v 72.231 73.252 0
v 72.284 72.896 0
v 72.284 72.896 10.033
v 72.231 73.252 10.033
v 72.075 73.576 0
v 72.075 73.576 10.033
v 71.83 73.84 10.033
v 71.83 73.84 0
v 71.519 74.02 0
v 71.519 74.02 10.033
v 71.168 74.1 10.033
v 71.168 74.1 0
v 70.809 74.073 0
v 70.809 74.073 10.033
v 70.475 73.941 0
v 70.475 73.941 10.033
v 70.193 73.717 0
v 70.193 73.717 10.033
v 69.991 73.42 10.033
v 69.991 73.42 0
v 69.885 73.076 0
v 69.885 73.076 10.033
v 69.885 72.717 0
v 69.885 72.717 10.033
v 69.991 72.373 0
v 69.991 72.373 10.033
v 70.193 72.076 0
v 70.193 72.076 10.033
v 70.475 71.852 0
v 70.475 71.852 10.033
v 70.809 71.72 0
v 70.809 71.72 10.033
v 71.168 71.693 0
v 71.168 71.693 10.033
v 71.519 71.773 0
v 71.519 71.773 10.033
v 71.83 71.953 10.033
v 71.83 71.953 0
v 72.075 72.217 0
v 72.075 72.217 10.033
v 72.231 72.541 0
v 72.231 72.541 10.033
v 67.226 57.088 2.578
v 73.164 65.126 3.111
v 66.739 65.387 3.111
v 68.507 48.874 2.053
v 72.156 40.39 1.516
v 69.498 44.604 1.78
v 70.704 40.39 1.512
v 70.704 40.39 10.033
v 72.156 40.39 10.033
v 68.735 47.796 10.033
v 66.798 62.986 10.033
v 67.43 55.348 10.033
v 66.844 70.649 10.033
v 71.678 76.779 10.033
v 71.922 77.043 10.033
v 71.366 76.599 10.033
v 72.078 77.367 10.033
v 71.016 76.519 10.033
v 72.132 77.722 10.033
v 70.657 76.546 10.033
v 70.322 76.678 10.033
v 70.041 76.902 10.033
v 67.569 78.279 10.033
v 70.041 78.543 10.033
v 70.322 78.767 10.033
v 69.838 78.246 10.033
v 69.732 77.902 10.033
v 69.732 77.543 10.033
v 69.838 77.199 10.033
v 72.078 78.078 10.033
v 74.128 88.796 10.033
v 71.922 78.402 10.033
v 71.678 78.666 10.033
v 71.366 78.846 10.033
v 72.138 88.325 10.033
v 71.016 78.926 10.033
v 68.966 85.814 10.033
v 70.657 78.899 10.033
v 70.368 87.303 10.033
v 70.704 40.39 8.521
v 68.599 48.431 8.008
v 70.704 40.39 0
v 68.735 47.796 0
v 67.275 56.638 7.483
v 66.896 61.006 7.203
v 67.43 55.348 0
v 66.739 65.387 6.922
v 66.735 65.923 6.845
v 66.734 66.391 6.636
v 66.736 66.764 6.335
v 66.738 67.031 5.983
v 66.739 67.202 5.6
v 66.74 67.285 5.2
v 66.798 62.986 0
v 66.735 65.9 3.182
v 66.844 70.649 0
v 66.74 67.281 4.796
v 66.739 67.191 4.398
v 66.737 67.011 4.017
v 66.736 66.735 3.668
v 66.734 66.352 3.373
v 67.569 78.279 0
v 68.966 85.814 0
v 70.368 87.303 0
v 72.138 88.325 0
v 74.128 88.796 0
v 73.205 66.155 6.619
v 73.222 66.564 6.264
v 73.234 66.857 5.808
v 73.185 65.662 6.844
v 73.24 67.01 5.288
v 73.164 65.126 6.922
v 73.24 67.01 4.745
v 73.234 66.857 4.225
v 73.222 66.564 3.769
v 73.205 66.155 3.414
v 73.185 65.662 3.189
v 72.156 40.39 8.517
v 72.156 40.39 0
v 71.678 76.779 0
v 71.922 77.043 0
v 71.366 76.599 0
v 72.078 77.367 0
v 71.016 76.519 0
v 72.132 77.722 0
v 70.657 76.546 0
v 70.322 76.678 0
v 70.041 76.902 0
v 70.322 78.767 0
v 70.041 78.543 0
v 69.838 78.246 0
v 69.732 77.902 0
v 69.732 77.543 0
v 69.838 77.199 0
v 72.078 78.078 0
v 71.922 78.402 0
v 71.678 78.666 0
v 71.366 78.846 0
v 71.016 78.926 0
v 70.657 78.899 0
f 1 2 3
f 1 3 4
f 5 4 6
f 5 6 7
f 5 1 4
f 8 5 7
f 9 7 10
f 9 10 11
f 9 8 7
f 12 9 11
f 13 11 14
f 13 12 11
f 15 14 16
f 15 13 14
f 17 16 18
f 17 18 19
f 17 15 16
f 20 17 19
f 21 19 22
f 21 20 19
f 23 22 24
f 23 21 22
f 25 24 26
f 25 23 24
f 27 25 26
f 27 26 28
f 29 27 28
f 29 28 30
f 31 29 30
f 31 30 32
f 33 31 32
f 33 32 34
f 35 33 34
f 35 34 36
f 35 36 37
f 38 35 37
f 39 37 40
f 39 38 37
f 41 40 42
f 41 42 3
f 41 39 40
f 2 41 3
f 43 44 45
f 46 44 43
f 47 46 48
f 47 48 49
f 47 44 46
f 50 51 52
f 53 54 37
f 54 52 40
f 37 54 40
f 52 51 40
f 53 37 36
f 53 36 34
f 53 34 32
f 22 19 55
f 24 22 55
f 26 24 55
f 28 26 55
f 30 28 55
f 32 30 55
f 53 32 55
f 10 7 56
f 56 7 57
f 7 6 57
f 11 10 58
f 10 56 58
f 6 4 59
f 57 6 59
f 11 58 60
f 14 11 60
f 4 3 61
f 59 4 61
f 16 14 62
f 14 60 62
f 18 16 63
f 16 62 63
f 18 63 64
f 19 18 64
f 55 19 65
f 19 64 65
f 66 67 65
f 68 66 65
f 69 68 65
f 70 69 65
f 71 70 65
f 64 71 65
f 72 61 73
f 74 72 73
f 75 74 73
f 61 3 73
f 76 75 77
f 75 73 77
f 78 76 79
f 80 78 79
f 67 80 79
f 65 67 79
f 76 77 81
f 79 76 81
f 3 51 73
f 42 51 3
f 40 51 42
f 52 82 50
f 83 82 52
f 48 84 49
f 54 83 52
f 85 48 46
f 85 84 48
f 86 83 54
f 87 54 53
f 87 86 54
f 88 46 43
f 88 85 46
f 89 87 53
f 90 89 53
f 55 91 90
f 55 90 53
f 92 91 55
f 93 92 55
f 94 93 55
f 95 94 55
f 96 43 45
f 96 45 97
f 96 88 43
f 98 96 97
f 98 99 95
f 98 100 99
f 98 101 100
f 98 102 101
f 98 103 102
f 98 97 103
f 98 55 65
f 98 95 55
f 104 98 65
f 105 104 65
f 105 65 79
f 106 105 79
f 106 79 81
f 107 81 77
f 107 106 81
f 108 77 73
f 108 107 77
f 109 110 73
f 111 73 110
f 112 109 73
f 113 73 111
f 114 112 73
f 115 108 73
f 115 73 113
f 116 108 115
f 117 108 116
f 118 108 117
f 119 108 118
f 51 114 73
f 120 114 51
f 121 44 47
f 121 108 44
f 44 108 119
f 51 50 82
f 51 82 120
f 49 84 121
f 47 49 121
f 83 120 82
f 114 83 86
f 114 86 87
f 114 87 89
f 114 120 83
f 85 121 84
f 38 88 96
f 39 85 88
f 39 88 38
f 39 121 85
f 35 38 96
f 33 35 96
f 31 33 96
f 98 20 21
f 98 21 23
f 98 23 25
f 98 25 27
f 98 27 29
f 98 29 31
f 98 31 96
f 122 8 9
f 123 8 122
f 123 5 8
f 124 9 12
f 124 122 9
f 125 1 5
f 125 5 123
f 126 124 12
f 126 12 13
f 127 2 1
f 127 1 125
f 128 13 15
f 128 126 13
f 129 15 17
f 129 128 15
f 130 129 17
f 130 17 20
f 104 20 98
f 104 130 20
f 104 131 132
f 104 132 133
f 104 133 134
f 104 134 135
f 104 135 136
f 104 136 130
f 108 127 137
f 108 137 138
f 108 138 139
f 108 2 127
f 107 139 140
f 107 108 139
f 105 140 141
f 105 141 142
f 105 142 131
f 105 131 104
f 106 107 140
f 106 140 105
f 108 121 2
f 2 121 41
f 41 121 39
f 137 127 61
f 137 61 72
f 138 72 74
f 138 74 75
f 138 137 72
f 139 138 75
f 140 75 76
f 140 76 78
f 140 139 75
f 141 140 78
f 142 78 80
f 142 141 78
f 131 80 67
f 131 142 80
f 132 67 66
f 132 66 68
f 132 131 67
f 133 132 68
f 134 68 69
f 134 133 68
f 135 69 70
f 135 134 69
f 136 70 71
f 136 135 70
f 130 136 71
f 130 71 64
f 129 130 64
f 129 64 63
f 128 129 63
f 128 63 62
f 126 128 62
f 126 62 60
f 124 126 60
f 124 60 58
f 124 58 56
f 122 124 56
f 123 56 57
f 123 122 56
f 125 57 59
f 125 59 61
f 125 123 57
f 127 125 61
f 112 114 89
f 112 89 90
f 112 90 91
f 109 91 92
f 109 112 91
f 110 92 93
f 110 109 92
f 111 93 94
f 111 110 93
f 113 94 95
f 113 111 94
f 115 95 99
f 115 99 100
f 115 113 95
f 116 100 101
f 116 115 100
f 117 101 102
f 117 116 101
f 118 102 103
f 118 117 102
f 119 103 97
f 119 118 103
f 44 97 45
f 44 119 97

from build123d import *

# Parameters (mm, degrees)
SKETCH1_R           = 1.2065
BOSS_EXTRUDE1_DEPTH = 10.033
CUT_EXTRUDE1_DEPTH  = 10.033
CUT_EXTRUDE2_DEPTH  = 10.033


with BuildPart() as part:
    # Sketch1 → Boss-Extrude1 (new body)
    with BuildSketch(Plane.XY):
        with BuildLine():
            Line((74.127846298, 88.795942837), (72.00043944, 36.574422097))
            ThreePointArc((72.00043944, 36.574422097), (66.89810991, 60.973237803), (68.966334727, 85.813898433))
            ThreePointArc((68.966334727, 85.813898433), (71.21567331, 87.878558548), (74.127846298, 88.795942837))
        make_face()
        with Locations((70.925382829, 77.722422097)):
            Circle(SKETCH1_R, mode=Mode.SUBTRACT)
        with Locations((71.077782829, 72.896422097)):
            Circle(SKETCH1_R, mode=Mode.SUBTRACT)
    extrude(amount=BOSS_EXTRUDE1_DEPTH)

    # Sketch2 → Cut-Extrude1 (cut)
    with BuildSketch(Plane(origin=(70.393641123, -2.867704976, 0), x_dir=(0, 0, -1), z_dir=(0.999171234, -0.040704363, 0))):
        with BuildLine():
            Line((-1.27, 39.474842481), (-8.763, 39.474842481))
            Line((-8.763, 39.474842481), (-6.9215, 68.049842481))
            ThreePointArc((-6.9215, 68.049842481), (-5.0165, 69.954842481), (-3.1115, 68.049842481))
            Line((-3.1115, 68.049842481), (-1.27, 39.474842481))
        make_face()
    extrude(amount=-CUT_EXTRUDE1_DEPTH, mode=Mode.SUBTRACT)

    # Sketch3 → Cut-Extrude2 (cut)
    with BuildSketch(Plane.XY.offset(10.033)):
        with BuildLine():
            Line((70.704380761, 40.389805653), (72.155871014, 40.389805653))
            Line((72.155871014, 40.389805653), (72.00043944, 36.574422097))
            ThreePointArc((72.00043944, 36.574422097), (71.330186821, 38.474564785), (70.704380761, 40.389805653))
        make_face()
    extrude(amount=-CUT_EXTRUDE2_DEPTH, mode=Mode.SUBTRACT)


solid = part.part
